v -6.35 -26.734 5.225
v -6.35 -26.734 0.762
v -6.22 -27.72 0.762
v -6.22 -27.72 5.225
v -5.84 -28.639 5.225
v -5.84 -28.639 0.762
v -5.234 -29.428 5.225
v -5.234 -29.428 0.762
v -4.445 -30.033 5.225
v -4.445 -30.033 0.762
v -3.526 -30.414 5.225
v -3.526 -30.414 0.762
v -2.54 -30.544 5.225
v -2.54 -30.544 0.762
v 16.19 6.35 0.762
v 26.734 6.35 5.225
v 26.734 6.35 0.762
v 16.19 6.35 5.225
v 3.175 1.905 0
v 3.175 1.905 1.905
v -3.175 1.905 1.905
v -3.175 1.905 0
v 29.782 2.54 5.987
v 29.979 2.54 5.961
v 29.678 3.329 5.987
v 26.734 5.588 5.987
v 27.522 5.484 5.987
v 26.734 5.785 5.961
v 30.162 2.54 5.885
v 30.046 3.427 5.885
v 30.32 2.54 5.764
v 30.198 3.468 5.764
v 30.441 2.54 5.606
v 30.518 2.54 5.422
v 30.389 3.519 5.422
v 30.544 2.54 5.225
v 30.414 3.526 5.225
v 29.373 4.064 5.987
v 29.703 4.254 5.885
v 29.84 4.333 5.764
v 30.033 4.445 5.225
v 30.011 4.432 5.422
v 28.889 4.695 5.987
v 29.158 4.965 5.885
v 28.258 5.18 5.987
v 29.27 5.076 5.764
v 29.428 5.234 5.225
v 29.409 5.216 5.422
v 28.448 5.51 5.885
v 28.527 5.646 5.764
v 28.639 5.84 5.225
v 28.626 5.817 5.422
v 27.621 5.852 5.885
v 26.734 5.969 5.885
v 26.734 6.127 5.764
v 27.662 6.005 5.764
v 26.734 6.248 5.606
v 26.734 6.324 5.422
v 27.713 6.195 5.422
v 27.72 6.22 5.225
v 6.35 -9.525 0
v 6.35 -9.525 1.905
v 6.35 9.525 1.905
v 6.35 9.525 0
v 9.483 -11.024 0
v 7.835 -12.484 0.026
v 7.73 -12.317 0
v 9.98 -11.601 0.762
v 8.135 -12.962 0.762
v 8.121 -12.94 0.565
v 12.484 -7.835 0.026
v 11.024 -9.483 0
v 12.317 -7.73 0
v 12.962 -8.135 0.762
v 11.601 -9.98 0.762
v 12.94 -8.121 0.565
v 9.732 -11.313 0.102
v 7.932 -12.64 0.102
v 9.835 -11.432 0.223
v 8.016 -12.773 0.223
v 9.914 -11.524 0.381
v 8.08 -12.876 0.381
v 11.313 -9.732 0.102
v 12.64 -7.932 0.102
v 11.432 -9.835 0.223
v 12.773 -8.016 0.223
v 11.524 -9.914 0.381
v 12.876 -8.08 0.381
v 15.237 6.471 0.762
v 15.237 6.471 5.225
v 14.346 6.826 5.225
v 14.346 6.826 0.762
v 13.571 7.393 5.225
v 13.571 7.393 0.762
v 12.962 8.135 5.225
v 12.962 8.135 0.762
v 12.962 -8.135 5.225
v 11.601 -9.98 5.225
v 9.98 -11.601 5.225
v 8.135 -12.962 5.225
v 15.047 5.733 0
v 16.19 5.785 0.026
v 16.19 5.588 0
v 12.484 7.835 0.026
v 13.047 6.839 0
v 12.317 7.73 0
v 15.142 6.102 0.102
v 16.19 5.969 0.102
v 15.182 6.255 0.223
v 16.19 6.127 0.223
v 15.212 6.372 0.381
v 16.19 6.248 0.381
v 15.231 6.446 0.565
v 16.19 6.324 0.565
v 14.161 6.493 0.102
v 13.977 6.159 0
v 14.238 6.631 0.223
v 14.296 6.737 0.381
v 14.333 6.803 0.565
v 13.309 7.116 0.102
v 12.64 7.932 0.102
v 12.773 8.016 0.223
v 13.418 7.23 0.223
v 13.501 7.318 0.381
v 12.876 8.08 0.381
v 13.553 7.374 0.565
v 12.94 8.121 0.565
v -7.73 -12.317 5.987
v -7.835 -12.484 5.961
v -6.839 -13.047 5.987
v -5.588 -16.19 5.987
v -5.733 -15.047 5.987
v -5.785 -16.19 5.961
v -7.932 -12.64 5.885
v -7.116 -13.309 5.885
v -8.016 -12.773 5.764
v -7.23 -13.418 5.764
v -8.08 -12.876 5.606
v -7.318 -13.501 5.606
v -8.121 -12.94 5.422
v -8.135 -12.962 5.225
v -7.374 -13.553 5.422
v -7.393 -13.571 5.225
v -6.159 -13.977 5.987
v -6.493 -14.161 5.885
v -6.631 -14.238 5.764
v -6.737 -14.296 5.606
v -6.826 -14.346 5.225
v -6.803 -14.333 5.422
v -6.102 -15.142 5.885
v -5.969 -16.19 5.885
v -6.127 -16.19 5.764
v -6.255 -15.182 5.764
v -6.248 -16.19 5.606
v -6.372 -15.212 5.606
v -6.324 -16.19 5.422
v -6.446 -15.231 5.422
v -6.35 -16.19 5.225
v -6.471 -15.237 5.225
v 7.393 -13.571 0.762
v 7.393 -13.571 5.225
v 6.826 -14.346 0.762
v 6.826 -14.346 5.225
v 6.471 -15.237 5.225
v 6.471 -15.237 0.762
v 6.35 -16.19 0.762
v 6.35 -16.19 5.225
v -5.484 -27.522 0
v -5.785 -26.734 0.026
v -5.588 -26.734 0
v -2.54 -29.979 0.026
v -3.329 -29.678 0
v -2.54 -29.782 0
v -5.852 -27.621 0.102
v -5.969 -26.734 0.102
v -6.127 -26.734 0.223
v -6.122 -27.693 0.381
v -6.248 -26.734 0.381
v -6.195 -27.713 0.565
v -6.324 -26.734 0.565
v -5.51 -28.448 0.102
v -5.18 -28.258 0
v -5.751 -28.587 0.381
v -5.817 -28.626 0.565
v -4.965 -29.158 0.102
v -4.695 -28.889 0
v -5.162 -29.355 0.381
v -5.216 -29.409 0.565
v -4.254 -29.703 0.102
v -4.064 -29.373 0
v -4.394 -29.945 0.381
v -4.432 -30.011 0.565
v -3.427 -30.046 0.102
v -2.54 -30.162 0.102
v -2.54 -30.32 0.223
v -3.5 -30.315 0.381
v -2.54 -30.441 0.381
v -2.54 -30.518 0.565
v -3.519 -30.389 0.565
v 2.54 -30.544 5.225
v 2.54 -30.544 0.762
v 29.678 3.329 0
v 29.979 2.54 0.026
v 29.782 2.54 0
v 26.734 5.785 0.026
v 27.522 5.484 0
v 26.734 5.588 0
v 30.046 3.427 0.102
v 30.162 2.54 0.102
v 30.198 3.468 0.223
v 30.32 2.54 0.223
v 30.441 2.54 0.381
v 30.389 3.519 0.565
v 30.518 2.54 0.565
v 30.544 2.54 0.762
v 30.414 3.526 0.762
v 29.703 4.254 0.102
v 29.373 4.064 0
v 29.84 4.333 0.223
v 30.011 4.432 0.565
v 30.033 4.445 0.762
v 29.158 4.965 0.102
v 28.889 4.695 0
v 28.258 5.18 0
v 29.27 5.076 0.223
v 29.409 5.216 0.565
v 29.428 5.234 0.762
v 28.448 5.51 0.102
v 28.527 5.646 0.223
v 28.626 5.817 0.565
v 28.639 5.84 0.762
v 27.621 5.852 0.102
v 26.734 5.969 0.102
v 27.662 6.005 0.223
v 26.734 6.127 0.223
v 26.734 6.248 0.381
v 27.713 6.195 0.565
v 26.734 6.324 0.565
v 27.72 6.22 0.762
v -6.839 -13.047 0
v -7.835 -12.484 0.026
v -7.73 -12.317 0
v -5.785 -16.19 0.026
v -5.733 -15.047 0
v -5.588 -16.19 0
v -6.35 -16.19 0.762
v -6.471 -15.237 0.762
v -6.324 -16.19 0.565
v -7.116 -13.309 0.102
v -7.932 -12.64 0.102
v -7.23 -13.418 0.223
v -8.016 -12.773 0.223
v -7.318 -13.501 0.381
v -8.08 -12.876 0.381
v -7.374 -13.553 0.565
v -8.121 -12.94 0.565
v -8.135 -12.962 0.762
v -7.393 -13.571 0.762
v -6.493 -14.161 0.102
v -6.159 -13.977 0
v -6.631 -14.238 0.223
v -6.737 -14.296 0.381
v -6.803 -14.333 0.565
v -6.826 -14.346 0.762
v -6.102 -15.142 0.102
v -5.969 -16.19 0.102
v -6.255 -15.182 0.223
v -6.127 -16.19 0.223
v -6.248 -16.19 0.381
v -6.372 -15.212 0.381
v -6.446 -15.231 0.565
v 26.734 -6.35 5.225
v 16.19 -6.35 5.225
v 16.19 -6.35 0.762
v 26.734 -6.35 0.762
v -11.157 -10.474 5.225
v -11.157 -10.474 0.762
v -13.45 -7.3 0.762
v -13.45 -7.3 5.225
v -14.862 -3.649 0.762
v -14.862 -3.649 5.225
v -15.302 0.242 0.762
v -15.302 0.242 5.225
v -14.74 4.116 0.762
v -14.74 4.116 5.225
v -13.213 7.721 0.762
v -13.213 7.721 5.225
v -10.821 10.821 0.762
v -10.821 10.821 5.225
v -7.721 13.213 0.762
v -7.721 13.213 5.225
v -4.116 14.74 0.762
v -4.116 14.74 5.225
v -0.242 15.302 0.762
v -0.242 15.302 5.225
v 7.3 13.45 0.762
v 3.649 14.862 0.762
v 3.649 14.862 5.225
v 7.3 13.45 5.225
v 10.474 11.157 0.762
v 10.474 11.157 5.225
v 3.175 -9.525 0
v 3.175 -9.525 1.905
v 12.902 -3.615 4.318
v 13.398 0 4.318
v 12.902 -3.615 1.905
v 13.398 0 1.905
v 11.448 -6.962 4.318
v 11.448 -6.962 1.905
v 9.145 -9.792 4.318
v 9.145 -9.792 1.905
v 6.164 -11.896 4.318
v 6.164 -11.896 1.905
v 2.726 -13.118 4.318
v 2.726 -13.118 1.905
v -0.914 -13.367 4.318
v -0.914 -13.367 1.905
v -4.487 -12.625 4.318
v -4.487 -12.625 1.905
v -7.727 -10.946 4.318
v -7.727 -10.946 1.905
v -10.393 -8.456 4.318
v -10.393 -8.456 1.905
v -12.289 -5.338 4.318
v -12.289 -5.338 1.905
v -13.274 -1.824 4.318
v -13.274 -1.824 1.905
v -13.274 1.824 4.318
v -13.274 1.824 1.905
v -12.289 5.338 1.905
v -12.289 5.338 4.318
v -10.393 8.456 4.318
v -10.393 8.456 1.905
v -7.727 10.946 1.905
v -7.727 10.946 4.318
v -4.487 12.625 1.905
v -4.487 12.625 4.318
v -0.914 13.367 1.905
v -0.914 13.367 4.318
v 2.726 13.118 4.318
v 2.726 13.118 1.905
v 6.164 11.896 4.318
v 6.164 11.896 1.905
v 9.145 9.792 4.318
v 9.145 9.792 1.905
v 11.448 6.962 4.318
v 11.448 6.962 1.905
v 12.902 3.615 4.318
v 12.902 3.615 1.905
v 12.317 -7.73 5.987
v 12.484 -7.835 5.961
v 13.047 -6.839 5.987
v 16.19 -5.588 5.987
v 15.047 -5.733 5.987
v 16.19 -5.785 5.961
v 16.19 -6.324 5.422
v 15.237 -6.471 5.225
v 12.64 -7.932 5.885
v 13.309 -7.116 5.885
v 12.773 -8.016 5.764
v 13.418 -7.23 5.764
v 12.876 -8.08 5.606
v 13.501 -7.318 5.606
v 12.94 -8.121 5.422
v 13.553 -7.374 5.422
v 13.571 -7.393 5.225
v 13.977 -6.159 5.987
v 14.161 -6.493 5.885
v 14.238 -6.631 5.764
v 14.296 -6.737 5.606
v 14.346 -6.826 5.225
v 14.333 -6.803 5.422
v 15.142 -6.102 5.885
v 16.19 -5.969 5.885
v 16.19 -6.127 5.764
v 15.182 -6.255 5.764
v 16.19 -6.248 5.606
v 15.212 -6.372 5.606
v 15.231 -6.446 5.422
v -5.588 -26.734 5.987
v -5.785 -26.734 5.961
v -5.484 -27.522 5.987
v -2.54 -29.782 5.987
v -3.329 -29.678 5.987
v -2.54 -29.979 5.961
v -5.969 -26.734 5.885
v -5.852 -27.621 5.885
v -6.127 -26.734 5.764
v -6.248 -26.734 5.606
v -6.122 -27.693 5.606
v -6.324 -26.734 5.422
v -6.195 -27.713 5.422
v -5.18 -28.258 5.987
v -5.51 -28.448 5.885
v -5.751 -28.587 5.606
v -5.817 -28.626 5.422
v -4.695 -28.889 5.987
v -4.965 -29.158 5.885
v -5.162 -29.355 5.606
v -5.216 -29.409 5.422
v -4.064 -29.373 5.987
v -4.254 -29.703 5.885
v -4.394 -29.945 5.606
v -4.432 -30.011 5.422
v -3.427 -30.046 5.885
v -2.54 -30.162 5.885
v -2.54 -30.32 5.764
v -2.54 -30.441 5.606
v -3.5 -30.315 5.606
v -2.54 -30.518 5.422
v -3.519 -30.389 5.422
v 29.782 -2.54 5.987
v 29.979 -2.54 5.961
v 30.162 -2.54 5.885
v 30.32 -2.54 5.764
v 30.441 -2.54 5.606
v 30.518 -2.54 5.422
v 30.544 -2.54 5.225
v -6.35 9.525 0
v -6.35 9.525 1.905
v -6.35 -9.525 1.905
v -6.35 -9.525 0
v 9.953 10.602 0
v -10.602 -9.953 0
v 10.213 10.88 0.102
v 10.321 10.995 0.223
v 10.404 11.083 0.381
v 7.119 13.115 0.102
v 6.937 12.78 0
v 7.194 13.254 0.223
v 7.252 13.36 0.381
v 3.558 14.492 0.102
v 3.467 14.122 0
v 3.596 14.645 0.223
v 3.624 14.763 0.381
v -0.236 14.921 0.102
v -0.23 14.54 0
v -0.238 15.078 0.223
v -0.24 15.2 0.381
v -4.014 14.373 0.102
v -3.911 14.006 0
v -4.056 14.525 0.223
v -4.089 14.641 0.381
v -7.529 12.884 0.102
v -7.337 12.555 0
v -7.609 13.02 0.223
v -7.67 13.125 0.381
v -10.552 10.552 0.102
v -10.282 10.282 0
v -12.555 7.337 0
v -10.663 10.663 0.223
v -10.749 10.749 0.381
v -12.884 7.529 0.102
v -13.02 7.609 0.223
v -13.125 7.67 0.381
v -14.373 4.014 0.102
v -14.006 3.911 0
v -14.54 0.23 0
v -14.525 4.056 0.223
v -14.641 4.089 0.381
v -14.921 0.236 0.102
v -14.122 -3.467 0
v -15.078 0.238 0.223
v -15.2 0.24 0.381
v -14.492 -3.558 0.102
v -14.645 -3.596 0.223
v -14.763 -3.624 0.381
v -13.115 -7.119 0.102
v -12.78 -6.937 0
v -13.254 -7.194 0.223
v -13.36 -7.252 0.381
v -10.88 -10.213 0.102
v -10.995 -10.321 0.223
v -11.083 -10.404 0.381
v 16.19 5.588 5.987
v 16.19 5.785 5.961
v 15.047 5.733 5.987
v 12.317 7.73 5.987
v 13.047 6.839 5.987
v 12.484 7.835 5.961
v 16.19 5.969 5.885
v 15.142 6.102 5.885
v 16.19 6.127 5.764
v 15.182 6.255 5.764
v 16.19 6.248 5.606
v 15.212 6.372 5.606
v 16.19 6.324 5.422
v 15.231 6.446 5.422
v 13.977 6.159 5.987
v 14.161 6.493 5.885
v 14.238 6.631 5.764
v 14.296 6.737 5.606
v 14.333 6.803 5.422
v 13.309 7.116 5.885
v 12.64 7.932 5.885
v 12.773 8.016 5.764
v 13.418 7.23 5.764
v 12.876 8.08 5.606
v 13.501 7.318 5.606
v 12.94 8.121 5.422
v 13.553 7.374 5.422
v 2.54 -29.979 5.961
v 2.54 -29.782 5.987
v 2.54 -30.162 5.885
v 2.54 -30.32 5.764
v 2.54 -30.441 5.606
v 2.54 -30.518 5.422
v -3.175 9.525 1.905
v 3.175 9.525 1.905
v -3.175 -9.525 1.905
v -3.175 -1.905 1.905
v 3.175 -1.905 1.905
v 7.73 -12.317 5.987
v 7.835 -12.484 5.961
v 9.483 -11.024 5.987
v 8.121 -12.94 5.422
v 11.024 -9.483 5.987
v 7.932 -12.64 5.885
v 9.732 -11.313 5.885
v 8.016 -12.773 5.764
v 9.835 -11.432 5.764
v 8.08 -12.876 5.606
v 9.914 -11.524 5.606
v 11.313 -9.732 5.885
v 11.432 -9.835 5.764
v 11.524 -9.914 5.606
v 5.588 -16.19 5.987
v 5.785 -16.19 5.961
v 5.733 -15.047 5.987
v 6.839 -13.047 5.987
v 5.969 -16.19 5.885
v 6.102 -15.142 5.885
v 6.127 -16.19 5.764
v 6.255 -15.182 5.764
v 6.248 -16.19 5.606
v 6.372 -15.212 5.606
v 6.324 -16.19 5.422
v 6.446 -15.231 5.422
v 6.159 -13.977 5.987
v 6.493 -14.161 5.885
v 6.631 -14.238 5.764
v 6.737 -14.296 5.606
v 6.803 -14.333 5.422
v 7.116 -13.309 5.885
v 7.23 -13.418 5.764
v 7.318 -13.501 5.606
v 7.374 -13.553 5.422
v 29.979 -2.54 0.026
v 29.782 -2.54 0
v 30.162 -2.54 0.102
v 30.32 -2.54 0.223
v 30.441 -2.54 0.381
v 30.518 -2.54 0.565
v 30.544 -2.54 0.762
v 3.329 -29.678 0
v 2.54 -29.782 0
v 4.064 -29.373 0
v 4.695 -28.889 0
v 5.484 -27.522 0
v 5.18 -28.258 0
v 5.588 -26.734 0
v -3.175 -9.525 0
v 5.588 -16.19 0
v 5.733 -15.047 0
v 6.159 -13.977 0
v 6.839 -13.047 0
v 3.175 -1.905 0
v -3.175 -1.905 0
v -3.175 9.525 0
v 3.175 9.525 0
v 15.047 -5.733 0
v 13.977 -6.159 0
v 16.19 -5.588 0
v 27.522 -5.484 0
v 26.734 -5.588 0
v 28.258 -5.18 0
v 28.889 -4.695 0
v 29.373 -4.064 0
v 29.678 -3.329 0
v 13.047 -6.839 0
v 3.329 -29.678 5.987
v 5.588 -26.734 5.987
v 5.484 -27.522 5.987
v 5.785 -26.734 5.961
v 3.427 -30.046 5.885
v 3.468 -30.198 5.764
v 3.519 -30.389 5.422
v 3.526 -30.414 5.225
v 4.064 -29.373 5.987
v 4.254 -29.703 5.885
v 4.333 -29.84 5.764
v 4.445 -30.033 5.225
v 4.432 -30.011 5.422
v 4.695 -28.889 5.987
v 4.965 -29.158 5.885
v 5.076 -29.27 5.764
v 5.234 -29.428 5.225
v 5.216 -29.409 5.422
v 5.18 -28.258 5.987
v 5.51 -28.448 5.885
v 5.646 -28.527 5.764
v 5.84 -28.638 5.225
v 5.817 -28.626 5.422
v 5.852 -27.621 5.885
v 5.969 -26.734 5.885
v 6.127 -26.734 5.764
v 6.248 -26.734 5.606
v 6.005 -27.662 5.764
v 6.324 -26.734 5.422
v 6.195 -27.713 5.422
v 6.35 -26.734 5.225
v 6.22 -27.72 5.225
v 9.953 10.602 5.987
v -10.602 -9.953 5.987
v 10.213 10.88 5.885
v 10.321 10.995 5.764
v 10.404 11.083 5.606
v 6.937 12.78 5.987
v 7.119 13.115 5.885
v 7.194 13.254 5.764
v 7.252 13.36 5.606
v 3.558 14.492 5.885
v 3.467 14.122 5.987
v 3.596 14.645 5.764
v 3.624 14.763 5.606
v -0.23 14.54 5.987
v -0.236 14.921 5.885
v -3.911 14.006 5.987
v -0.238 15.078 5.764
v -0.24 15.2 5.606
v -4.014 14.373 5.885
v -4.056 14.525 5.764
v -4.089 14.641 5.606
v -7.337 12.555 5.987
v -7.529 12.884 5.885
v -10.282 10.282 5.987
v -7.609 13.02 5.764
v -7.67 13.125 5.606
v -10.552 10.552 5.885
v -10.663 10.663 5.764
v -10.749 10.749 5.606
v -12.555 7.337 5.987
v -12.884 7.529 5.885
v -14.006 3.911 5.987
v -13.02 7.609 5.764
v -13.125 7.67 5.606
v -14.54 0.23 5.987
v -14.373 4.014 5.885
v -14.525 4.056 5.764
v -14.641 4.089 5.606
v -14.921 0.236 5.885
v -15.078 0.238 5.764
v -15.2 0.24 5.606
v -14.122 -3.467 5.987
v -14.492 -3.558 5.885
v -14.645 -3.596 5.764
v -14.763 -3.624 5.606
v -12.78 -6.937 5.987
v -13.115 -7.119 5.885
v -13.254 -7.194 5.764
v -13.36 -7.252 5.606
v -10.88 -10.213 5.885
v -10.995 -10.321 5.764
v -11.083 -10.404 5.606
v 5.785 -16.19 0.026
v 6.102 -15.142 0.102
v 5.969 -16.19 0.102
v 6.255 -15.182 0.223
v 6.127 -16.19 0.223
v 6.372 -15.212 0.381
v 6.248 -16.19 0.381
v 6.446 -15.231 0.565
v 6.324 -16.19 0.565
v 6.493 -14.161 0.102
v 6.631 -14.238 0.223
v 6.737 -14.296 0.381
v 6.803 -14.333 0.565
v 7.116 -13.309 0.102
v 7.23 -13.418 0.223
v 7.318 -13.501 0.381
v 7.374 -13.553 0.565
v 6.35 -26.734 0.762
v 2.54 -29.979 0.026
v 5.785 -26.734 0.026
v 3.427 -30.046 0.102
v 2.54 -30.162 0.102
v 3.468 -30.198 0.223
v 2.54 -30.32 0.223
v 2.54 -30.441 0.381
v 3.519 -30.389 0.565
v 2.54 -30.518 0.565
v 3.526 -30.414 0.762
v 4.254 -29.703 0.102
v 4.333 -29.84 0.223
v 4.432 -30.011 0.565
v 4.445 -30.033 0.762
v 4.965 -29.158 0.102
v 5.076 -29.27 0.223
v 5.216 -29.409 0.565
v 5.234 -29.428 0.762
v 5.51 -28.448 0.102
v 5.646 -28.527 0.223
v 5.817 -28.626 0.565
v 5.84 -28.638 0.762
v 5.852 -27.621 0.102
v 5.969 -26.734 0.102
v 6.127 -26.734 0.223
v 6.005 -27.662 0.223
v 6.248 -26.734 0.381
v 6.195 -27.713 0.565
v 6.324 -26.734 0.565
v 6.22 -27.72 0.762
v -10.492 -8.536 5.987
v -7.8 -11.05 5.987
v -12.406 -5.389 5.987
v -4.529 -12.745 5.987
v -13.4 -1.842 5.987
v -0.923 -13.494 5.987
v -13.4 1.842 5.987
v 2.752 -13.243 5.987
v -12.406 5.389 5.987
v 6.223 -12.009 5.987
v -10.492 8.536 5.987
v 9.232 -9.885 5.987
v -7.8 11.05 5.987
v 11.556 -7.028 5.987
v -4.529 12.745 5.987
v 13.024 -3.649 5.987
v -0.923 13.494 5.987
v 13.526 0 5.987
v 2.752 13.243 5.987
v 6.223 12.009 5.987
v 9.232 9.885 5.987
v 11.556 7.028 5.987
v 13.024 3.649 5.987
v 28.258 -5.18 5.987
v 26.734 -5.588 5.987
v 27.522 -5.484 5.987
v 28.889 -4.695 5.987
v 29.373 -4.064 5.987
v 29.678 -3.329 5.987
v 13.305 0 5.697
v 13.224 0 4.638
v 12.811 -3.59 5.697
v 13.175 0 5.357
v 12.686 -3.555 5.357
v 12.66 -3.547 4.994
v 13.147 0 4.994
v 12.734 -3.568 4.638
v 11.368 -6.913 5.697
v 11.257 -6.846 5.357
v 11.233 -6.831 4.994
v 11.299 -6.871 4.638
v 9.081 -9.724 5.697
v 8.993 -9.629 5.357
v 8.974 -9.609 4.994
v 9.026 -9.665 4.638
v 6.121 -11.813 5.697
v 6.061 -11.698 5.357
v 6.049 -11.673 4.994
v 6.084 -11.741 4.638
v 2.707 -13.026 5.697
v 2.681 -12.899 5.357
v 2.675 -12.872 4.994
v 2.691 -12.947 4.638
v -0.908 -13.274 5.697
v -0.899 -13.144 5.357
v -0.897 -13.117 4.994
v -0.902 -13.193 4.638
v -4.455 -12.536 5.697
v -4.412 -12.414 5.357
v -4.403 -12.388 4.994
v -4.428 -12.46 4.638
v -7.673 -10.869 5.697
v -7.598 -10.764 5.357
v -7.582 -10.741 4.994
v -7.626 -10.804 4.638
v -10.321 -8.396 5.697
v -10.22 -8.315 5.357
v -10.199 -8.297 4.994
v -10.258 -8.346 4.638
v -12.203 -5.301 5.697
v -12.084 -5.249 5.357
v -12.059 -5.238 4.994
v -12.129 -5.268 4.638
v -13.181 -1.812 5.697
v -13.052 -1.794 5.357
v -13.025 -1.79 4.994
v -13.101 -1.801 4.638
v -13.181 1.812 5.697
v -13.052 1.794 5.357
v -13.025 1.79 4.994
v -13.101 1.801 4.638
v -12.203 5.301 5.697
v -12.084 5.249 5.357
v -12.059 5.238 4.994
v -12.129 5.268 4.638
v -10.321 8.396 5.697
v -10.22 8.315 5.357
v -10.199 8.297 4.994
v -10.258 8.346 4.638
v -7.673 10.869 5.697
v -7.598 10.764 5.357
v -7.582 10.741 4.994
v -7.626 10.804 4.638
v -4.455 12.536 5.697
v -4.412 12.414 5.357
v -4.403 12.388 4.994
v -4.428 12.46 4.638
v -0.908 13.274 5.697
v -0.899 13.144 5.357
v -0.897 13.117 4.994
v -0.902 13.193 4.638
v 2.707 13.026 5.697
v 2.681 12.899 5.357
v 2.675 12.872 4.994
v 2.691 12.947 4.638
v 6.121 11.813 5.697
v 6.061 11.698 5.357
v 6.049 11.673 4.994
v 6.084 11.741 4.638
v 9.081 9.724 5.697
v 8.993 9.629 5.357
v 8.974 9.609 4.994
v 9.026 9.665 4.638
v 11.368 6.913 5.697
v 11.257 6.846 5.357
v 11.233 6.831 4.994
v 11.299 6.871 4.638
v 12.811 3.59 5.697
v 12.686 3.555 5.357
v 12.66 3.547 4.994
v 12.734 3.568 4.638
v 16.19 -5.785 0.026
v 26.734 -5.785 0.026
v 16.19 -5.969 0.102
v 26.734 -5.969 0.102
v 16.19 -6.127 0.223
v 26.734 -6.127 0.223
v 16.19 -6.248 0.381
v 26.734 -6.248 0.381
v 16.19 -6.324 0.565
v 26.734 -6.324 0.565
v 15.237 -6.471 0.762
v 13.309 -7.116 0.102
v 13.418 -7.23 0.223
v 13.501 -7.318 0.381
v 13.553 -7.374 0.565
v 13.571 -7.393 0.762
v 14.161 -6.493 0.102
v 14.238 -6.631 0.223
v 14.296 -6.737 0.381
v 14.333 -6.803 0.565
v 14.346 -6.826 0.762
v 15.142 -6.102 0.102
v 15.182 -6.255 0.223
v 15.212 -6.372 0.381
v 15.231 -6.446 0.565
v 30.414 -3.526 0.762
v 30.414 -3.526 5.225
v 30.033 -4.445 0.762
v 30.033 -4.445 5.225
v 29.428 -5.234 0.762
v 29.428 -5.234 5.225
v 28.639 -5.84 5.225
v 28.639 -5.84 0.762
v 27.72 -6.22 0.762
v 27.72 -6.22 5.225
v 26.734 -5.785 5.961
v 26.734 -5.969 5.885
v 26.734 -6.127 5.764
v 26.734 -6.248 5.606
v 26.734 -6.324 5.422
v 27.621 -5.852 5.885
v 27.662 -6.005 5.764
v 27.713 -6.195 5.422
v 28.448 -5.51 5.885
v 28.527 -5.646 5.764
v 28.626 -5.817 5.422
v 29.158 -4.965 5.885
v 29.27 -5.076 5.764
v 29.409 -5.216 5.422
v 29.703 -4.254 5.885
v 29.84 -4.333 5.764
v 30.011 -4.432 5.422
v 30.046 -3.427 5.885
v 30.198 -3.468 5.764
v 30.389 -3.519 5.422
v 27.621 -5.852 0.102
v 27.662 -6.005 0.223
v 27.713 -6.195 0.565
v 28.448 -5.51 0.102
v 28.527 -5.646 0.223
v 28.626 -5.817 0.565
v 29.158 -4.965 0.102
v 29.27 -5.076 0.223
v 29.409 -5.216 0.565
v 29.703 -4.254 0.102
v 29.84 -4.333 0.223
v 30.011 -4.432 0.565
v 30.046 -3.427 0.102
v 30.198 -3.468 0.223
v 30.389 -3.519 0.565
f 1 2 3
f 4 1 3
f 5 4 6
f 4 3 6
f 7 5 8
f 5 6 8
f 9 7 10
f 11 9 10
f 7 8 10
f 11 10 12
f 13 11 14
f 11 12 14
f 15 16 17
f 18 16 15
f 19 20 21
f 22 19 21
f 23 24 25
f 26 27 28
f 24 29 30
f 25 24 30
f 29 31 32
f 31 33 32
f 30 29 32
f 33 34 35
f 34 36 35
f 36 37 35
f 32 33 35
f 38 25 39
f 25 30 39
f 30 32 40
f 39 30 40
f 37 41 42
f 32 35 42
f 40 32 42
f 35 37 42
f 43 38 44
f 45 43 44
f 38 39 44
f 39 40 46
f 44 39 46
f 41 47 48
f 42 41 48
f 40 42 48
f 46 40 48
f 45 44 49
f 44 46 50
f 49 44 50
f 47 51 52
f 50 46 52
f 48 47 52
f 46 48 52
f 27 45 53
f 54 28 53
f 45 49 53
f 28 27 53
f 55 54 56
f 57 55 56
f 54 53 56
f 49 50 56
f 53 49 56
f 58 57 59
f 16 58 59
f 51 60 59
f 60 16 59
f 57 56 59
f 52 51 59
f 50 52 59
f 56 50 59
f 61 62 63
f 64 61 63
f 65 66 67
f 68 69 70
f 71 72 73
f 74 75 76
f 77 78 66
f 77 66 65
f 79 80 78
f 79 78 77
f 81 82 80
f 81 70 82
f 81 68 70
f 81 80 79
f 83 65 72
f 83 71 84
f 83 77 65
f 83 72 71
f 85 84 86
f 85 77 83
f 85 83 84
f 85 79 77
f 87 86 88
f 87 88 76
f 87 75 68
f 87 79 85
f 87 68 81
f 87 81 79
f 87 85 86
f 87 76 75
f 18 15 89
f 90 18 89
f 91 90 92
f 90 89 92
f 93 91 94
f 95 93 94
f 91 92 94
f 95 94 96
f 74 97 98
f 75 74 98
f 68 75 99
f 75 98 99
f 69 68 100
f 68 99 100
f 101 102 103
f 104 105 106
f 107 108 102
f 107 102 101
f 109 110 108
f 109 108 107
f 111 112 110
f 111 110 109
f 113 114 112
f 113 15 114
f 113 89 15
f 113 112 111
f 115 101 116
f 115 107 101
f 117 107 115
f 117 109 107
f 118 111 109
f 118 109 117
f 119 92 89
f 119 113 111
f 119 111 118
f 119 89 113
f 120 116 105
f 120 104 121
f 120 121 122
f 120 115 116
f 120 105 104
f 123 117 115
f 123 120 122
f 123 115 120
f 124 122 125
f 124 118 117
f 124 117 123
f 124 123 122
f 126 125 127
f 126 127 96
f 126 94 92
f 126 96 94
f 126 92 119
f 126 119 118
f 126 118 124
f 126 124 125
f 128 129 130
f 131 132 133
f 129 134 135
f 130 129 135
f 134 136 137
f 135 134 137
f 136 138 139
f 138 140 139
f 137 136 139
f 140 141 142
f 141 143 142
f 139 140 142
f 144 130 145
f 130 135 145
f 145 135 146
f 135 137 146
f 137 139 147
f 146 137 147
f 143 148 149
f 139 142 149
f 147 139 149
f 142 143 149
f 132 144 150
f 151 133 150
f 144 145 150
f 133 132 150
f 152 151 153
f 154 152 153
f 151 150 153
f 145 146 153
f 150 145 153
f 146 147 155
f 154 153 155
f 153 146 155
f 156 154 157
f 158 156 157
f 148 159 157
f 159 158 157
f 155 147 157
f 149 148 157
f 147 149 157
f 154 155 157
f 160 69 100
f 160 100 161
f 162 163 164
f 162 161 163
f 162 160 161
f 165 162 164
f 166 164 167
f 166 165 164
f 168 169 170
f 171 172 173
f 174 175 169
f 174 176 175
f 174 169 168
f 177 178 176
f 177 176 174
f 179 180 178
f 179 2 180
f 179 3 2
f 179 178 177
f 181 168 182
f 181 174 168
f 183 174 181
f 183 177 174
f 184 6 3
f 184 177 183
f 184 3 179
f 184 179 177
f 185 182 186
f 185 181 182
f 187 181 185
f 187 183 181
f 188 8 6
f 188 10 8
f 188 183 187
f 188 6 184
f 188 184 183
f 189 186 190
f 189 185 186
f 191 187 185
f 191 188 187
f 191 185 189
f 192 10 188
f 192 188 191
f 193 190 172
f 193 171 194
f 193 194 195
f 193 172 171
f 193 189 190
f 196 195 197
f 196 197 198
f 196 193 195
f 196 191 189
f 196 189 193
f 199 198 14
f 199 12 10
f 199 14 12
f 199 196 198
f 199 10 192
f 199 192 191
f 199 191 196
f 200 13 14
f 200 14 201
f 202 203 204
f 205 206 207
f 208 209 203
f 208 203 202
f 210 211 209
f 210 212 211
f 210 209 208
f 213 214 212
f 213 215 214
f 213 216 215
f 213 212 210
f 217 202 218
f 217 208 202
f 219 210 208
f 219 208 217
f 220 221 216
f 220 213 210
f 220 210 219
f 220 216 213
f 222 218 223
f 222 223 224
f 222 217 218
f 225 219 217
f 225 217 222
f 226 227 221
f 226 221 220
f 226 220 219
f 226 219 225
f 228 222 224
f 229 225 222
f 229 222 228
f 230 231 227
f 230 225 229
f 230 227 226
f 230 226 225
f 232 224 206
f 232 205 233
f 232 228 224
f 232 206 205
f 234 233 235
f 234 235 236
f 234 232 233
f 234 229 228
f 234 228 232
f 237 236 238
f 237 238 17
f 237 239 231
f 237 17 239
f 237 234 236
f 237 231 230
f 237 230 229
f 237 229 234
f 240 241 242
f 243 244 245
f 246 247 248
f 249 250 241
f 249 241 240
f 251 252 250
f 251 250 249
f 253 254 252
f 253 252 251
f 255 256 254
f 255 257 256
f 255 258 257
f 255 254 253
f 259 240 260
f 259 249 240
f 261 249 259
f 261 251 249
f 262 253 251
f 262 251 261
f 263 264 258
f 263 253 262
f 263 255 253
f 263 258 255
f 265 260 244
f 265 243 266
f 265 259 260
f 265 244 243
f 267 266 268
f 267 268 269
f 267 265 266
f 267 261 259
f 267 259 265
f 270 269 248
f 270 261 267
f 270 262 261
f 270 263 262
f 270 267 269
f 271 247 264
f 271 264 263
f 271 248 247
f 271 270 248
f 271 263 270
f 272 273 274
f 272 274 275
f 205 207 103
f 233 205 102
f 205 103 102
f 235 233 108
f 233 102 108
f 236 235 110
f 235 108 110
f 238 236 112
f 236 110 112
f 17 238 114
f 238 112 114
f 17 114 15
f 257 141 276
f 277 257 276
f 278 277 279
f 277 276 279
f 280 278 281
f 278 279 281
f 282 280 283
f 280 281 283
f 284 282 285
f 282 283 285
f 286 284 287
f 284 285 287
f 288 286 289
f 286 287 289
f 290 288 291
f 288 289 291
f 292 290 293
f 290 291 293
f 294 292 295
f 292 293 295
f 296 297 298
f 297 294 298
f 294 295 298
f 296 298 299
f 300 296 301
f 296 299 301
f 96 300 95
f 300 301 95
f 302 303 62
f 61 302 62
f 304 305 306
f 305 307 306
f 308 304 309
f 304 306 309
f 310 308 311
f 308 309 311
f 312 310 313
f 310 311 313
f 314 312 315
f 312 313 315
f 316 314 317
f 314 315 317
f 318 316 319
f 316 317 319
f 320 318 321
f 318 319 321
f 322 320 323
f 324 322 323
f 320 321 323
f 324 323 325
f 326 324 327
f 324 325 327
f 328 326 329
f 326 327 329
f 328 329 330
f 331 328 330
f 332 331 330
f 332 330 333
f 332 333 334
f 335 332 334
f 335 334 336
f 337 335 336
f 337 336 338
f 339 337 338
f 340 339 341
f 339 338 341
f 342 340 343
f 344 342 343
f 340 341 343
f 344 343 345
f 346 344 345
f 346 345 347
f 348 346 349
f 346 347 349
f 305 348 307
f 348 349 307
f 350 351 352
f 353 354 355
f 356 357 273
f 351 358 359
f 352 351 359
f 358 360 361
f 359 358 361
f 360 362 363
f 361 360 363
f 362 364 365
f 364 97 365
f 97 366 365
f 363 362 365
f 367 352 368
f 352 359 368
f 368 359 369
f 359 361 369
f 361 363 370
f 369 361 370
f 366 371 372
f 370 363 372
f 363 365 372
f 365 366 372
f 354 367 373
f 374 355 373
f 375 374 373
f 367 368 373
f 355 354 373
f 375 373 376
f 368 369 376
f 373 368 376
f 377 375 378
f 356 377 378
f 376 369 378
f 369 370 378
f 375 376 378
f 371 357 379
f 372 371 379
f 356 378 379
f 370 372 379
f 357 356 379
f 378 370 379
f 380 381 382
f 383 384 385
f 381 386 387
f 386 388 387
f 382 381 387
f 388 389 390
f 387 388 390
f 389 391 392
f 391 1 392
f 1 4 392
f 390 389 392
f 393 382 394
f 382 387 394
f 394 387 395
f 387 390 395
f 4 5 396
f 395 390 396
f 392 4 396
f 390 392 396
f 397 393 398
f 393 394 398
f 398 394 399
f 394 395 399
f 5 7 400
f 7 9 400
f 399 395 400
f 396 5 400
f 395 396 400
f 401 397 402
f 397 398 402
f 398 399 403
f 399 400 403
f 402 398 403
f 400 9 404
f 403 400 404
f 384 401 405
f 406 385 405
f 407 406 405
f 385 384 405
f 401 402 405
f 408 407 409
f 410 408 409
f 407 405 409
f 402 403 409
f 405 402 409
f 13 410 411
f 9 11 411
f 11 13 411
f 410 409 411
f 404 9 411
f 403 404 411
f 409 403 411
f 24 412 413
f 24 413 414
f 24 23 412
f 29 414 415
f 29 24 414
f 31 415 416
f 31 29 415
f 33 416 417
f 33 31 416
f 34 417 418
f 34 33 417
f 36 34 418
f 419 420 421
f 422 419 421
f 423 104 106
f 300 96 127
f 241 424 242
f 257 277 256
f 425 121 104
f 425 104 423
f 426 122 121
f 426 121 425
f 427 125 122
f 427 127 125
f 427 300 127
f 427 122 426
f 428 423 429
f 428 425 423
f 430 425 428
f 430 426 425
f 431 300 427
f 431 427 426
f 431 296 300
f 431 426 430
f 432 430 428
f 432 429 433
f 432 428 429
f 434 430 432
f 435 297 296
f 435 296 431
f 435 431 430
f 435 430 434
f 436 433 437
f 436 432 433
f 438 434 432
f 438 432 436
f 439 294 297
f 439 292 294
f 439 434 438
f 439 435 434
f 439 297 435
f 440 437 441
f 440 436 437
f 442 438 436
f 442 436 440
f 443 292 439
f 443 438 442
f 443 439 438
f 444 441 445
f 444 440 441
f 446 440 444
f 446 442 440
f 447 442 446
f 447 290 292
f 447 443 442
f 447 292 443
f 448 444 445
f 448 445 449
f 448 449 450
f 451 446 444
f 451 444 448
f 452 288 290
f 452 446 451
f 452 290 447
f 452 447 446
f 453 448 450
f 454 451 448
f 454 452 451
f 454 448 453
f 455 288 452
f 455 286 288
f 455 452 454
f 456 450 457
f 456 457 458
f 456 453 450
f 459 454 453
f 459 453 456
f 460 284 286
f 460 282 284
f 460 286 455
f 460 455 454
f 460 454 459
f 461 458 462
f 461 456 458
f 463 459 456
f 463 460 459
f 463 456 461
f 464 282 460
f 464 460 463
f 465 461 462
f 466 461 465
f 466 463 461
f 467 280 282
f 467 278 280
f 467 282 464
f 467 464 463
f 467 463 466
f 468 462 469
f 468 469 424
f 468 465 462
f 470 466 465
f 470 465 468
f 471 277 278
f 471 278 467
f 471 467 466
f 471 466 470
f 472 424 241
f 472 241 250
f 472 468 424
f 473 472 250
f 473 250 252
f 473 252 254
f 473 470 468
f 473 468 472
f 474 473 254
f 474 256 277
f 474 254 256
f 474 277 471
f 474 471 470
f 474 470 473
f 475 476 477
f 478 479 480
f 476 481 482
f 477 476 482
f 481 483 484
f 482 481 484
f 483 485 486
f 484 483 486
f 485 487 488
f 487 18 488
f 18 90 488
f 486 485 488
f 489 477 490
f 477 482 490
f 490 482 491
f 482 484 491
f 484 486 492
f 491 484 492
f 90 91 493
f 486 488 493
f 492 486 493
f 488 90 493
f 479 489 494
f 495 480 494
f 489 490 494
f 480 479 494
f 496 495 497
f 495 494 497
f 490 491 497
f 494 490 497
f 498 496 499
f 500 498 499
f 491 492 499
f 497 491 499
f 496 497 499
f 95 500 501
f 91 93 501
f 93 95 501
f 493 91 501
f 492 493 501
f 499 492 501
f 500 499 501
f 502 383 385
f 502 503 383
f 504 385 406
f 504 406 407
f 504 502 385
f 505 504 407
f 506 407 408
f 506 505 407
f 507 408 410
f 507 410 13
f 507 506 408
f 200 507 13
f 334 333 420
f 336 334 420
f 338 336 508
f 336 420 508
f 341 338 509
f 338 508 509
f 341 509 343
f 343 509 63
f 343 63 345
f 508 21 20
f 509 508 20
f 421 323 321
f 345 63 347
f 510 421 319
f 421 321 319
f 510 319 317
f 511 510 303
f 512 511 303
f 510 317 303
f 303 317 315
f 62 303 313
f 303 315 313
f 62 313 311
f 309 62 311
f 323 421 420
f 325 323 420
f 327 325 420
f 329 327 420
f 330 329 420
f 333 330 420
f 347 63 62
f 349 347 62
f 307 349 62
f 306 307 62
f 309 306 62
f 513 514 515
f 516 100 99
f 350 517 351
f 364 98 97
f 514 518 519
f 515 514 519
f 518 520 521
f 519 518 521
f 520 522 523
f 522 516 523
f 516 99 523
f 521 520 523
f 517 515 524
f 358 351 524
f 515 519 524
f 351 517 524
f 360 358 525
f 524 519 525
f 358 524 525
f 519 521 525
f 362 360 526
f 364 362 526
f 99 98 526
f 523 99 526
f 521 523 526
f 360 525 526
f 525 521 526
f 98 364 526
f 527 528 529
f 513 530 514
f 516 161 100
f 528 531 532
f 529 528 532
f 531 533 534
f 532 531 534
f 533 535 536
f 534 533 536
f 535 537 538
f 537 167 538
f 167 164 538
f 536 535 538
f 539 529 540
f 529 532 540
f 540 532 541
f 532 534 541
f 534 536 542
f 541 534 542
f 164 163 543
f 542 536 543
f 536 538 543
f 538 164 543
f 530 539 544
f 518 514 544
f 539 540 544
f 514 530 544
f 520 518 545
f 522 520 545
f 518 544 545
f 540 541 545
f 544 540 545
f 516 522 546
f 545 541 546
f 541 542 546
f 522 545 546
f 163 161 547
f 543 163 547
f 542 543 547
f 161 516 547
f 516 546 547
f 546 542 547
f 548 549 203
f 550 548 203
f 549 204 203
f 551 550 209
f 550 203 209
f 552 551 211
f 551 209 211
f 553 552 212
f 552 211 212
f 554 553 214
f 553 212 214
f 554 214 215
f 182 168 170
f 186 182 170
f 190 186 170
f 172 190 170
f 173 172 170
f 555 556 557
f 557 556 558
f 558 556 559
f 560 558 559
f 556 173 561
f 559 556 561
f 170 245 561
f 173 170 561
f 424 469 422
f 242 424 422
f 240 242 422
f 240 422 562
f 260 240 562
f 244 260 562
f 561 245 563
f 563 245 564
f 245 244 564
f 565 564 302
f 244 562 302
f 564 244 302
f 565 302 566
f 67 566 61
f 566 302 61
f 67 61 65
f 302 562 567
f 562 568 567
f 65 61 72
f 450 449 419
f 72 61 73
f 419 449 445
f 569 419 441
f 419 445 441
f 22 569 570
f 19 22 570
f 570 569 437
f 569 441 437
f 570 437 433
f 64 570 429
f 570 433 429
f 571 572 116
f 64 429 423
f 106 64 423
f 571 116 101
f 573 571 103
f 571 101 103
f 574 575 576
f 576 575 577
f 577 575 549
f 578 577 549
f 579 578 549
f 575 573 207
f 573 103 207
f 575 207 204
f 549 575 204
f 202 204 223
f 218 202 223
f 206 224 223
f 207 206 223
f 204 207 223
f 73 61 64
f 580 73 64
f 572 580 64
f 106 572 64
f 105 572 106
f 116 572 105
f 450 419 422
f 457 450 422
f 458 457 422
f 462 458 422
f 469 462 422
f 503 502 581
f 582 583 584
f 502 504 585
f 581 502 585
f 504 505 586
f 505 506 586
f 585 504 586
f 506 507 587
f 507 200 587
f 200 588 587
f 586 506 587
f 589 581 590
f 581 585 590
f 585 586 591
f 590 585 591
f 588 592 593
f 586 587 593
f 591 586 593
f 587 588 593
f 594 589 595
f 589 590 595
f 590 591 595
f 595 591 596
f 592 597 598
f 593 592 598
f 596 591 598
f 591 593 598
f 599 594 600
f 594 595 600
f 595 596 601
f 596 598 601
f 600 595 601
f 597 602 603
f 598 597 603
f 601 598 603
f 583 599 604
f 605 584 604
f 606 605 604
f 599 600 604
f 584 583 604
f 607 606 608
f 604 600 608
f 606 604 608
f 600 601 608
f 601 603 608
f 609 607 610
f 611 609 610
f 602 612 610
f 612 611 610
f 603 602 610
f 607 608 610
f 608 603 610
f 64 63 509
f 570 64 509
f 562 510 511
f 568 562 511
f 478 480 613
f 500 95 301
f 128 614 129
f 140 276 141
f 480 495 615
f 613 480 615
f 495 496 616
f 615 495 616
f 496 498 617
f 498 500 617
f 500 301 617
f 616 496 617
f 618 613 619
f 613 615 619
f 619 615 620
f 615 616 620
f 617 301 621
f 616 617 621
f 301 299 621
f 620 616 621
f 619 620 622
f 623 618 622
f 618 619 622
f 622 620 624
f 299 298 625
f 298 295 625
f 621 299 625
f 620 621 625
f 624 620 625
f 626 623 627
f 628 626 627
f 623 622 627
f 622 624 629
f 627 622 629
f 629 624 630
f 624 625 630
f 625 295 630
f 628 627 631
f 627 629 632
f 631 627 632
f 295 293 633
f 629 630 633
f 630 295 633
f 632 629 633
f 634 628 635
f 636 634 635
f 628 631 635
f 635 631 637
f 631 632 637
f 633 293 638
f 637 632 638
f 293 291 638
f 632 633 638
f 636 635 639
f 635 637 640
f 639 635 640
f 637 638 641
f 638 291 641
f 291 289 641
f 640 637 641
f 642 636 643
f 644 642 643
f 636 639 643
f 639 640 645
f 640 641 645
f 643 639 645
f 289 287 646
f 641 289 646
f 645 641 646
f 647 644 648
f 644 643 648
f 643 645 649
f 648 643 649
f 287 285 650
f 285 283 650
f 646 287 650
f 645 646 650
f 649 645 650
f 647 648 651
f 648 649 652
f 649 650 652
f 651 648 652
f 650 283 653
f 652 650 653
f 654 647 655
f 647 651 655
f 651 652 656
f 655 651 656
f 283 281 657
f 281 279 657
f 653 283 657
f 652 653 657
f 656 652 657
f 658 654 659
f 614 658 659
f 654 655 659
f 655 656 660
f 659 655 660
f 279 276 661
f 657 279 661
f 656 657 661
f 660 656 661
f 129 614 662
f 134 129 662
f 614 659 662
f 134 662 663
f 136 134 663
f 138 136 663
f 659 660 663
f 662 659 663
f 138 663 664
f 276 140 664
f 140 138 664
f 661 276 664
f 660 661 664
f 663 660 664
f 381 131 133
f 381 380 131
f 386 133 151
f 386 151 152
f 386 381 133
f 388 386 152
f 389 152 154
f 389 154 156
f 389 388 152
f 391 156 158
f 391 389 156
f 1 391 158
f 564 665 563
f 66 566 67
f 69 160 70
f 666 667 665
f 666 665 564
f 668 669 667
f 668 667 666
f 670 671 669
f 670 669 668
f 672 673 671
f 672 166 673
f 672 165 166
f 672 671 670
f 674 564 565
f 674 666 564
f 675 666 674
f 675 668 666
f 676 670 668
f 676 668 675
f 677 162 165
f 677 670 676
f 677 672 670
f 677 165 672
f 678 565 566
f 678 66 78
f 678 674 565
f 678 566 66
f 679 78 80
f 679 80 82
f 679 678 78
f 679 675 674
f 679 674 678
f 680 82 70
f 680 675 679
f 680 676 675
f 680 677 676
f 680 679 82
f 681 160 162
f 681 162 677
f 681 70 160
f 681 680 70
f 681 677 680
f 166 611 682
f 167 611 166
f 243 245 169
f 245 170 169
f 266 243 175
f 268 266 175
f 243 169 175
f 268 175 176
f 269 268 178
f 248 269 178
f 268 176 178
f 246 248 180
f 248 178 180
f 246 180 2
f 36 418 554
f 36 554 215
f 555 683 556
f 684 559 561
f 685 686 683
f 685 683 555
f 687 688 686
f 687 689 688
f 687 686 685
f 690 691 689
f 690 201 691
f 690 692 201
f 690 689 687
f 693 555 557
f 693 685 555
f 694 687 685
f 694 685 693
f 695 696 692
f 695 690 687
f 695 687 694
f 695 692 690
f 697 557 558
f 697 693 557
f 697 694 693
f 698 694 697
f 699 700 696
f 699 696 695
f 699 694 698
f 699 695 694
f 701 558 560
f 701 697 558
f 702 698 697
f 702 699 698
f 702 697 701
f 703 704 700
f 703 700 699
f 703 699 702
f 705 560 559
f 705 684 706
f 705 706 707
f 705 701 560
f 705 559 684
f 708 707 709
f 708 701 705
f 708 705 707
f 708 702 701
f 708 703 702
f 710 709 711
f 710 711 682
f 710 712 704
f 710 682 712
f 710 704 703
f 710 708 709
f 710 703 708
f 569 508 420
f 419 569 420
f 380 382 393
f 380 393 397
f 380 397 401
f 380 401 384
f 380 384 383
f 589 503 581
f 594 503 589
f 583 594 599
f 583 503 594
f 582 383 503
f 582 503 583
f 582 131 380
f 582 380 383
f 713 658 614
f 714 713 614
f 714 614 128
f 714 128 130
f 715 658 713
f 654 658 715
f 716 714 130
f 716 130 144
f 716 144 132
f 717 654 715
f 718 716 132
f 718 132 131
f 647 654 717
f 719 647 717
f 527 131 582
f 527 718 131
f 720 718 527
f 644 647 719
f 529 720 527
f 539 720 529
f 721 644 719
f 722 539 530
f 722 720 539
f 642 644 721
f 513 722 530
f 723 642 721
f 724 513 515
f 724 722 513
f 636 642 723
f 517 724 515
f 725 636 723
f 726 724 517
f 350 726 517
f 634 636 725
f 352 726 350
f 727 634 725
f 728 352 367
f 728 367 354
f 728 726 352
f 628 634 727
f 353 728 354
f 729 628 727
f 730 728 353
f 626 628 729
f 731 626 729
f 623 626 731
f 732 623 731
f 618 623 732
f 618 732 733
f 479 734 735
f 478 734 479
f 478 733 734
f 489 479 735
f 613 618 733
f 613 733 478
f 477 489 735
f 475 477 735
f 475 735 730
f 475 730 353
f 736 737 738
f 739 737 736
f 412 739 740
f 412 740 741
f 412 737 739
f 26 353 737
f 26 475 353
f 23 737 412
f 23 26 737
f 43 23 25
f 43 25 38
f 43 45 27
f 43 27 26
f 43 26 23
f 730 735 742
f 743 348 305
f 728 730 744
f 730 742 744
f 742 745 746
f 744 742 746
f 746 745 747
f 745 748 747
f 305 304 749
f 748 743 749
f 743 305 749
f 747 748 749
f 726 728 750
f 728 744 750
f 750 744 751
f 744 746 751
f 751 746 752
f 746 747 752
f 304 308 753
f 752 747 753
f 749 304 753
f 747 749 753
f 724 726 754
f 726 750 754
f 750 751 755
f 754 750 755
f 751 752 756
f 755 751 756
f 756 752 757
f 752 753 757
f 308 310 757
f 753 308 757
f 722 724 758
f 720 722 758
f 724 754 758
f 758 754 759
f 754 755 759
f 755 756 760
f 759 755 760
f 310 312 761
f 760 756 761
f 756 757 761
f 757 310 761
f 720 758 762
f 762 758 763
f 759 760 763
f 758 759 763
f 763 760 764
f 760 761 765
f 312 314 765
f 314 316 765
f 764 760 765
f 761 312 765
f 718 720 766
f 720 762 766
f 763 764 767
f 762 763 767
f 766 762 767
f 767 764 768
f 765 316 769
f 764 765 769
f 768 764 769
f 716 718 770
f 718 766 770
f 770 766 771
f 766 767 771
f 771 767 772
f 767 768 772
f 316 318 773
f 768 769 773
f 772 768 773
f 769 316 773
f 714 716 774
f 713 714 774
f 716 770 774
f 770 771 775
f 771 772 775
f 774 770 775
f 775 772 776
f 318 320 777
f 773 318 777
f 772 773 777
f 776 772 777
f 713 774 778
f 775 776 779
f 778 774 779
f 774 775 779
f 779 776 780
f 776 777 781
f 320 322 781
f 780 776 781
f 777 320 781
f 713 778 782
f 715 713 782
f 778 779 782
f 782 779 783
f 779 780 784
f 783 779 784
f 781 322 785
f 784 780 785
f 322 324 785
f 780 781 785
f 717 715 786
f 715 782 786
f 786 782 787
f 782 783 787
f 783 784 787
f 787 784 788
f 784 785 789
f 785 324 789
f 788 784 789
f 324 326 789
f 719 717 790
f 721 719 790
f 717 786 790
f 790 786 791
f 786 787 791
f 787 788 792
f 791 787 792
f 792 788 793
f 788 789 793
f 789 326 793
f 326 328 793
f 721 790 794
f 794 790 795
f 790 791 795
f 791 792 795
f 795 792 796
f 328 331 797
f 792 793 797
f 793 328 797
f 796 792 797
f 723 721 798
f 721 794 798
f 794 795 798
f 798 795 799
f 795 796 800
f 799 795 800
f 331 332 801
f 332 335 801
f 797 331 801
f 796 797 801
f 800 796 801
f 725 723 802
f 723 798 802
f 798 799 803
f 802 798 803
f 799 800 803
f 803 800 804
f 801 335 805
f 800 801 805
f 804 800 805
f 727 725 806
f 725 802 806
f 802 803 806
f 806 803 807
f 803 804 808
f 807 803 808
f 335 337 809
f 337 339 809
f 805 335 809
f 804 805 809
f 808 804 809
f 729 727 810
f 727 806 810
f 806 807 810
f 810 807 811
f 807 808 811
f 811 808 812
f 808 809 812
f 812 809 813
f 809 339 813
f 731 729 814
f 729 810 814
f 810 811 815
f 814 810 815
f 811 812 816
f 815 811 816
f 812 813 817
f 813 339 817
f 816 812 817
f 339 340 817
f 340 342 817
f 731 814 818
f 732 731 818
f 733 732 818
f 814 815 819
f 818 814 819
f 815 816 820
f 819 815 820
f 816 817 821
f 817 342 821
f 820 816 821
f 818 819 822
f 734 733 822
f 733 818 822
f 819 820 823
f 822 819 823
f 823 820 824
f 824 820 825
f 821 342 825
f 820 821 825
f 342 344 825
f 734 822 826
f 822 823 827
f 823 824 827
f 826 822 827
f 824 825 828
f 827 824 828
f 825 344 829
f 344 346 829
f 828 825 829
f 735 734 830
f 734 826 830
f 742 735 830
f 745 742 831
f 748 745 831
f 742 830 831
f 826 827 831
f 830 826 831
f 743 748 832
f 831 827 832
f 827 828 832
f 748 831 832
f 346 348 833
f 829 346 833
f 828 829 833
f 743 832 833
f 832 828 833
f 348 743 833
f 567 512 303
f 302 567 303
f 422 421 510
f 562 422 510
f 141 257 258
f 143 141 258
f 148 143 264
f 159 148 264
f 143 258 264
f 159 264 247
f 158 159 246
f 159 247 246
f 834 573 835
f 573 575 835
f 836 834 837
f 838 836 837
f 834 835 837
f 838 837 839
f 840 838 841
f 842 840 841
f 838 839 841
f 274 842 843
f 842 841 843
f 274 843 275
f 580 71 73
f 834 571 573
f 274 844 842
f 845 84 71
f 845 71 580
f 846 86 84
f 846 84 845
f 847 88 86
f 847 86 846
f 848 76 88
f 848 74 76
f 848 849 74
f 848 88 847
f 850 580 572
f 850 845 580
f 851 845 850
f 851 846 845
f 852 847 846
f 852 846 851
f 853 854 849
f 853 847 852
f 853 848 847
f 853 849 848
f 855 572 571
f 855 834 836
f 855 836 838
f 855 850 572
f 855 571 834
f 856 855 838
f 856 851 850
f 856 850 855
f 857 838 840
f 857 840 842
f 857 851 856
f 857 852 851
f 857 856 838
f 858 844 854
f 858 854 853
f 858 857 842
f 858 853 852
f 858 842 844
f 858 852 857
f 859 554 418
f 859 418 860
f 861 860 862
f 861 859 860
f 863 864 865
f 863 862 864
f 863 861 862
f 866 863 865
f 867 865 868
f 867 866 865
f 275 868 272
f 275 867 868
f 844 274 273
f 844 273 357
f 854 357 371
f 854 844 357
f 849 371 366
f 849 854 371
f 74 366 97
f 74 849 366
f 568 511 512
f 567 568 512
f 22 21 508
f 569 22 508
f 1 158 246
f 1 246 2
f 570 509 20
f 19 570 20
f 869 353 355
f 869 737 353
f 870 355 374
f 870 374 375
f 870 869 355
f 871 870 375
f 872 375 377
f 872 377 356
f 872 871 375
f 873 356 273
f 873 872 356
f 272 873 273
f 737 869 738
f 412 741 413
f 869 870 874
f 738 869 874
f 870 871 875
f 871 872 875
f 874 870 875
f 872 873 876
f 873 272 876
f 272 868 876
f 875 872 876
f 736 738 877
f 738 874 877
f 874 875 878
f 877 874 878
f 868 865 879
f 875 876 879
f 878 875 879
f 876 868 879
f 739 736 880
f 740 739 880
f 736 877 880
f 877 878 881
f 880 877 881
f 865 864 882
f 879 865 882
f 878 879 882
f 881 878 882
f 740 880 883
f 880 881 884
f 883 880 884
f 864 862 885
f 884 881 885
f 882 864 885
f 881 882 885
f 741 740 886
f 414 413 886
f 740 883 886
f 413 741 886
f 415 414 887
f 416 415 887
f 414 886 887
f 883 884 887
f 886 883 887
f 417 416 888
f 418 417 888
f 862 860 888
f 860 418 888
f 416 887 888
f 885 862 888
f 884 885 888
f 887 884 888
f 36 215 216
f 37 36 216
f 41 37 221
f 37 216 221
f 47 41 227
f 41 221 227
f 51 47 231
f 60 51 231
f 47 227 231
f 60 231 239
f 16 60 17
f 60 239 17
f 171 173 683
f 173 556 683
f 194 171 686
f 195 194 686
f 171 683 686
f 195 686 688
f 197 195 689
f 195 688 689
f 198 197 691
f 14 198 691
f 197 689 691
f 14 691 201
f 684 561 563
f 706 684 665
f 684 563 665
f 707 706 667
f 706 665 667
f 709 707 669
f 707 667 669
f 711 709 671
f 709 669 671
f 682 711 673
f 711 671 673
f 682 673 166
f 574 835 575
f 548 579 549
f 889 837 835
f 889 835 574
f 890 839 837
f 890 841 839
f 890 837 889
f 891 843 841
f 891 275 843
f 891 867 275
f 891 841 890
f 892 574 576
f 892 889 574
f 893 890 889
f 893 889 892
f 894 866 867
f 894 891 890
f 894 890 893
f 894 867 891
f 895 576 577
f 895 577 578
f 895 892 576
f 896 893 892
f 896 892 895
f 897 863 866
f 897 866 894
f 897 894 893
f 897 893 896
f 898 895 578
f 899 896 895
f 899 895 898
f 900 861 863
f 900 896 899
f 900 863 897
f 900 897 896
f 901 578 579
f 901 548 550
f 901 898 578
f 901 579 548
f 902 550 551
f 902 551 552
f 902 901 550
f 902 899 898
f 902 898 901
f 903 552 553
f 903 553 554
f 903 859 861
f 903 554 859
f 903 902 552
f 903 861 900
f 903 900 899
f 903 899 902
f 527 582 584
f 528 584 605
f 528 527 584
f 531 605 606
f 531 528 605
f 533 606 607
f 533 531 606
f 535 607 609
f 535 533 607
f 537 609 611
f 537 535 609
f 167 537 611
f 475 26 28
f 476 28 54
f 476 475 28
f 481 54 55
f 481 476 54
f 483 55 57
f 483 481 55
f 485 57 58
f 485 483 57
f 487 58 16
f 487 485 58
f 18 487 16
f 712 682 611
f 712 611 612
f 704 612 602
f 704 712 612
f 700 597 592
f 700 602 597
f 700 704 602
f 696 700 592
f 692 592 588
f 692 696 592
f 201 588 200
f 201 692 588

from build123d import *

# Parameters (mm, degrees)
F3_DEPTH = 5.9869614104
F4_R     = 3.81
F5_R     = 0.762
F7_DEPTH = 25.4


with BuildPart() as f1:
    # F0 (on Front) → F1 (revolve)
    with BuildSketch(Plane.XZ):
        with BuildLine():
            Line((15.3035, 0), (15.3035, 4.1730385896))
            ThreePointArc((15.3035, 4.1730385896), (14.3181376493, 3.8136610654), (13.3985, 4.318))
            Line((13.3985, 4.318), (13.3985, 1.905))
            Line((13.3985, 1.905), (0, 1.905))
            Line((0, 1.905), (0, 0))
            Line((0, 0), (15.3035, 0))
        make_face()
        with BuildLine():
            ThreePointArc((13.3985, 4.318), (14.3181376493, 3.8136610654), (15.3035, 4.1730385896))
            Line((15.3035, 4.1730385896), (15.3035, 5.9869614104))
            Line((15.3035, 5.9869614104), (13.5255, 5.9869614104))
            ThreePointArc((13.5255, 5.9869614104), (13.1481610654, 5.1763623507), (13.3985, 4.318))
        make_face()
    revolve(axis=Axis((0, 0, 4.2298094004), (0, 0, -1)))

    # F2 (on face) → F3 (join, through all)
    with BuildSketch(Plane.XY.offset(5.9869614104)):
        with BuildLine():
            Line((30.5435, -6.35), (30.5435, 6.35))
            Line((30.5435, 6.35), (13.9238863917, 6.35))
            ThreePointArc((13.9238863917, 6.35), (15.3035, 0), (13.9238863917, -6.35))
            Line((13.9238863917, -6.35), (30.5435, -6.35))
        make_face()
        with BuildLine():
            Line((-6.35, -30.5435), (6.35, -30.5435))
            Line((6.35, -30.5435), (6.35, -13.9238863917))
            ThreePointArc((6.35, -13.9238863917), (0, -15.3035), (-6.35, -13.9238863917))
            Line((-6.35, -13.9238863917), (-6.35, -30.5435))
        make_face()
    extrude(amount=-F3_DEPTH)

    # F4
    f4_edges = [f1.edges().sort_by_distance(p)[0] for p in [
        (-6.35, -30.5435, 2.993481),
        (-6.35, -13.923886, 2.993481),
        (6.35, -30.5435, 2.993481),
        (6.35, -13.923886, 2.993481),
        (13.923886, -6.35, 2.993481),
        (30.5435, -6.35, 2.993481),
        (30.5435, 6.35, 2.993481),
        (13.923886, 6.35, 2.993481),
    ]]
    fillet(f4_edges, radius=F4_R)

    # F5
    f5_edges = [f1.edges().sort_by_distance(p)[0] for p in [
        (0, -30.5435, 5.986961),
        (0, -30.5435, 0),
    ]]
    fillet(f5_edges, radius=F5_R)

    # F6 (on face) → F7 (cut)
    with BuildSketch(Plane.XY.offset(1.905)):
        Polygon((-3.175, 9.525), (-6.35, 9.525), (-6.35, -9.525), (-3.175, -9.525), (-3.175, -1.905), (3.175, -1.905), (3.175, -9.525), (6.35, -9.525), (6.35, 9.525), (3.175, 9.525), (3.175, 1.905), (-3.175, 1.905), align=None)
    extrude(amount=-F7_DEPTH, mode=Mode.SUBTRACT)


solid = f1.part
